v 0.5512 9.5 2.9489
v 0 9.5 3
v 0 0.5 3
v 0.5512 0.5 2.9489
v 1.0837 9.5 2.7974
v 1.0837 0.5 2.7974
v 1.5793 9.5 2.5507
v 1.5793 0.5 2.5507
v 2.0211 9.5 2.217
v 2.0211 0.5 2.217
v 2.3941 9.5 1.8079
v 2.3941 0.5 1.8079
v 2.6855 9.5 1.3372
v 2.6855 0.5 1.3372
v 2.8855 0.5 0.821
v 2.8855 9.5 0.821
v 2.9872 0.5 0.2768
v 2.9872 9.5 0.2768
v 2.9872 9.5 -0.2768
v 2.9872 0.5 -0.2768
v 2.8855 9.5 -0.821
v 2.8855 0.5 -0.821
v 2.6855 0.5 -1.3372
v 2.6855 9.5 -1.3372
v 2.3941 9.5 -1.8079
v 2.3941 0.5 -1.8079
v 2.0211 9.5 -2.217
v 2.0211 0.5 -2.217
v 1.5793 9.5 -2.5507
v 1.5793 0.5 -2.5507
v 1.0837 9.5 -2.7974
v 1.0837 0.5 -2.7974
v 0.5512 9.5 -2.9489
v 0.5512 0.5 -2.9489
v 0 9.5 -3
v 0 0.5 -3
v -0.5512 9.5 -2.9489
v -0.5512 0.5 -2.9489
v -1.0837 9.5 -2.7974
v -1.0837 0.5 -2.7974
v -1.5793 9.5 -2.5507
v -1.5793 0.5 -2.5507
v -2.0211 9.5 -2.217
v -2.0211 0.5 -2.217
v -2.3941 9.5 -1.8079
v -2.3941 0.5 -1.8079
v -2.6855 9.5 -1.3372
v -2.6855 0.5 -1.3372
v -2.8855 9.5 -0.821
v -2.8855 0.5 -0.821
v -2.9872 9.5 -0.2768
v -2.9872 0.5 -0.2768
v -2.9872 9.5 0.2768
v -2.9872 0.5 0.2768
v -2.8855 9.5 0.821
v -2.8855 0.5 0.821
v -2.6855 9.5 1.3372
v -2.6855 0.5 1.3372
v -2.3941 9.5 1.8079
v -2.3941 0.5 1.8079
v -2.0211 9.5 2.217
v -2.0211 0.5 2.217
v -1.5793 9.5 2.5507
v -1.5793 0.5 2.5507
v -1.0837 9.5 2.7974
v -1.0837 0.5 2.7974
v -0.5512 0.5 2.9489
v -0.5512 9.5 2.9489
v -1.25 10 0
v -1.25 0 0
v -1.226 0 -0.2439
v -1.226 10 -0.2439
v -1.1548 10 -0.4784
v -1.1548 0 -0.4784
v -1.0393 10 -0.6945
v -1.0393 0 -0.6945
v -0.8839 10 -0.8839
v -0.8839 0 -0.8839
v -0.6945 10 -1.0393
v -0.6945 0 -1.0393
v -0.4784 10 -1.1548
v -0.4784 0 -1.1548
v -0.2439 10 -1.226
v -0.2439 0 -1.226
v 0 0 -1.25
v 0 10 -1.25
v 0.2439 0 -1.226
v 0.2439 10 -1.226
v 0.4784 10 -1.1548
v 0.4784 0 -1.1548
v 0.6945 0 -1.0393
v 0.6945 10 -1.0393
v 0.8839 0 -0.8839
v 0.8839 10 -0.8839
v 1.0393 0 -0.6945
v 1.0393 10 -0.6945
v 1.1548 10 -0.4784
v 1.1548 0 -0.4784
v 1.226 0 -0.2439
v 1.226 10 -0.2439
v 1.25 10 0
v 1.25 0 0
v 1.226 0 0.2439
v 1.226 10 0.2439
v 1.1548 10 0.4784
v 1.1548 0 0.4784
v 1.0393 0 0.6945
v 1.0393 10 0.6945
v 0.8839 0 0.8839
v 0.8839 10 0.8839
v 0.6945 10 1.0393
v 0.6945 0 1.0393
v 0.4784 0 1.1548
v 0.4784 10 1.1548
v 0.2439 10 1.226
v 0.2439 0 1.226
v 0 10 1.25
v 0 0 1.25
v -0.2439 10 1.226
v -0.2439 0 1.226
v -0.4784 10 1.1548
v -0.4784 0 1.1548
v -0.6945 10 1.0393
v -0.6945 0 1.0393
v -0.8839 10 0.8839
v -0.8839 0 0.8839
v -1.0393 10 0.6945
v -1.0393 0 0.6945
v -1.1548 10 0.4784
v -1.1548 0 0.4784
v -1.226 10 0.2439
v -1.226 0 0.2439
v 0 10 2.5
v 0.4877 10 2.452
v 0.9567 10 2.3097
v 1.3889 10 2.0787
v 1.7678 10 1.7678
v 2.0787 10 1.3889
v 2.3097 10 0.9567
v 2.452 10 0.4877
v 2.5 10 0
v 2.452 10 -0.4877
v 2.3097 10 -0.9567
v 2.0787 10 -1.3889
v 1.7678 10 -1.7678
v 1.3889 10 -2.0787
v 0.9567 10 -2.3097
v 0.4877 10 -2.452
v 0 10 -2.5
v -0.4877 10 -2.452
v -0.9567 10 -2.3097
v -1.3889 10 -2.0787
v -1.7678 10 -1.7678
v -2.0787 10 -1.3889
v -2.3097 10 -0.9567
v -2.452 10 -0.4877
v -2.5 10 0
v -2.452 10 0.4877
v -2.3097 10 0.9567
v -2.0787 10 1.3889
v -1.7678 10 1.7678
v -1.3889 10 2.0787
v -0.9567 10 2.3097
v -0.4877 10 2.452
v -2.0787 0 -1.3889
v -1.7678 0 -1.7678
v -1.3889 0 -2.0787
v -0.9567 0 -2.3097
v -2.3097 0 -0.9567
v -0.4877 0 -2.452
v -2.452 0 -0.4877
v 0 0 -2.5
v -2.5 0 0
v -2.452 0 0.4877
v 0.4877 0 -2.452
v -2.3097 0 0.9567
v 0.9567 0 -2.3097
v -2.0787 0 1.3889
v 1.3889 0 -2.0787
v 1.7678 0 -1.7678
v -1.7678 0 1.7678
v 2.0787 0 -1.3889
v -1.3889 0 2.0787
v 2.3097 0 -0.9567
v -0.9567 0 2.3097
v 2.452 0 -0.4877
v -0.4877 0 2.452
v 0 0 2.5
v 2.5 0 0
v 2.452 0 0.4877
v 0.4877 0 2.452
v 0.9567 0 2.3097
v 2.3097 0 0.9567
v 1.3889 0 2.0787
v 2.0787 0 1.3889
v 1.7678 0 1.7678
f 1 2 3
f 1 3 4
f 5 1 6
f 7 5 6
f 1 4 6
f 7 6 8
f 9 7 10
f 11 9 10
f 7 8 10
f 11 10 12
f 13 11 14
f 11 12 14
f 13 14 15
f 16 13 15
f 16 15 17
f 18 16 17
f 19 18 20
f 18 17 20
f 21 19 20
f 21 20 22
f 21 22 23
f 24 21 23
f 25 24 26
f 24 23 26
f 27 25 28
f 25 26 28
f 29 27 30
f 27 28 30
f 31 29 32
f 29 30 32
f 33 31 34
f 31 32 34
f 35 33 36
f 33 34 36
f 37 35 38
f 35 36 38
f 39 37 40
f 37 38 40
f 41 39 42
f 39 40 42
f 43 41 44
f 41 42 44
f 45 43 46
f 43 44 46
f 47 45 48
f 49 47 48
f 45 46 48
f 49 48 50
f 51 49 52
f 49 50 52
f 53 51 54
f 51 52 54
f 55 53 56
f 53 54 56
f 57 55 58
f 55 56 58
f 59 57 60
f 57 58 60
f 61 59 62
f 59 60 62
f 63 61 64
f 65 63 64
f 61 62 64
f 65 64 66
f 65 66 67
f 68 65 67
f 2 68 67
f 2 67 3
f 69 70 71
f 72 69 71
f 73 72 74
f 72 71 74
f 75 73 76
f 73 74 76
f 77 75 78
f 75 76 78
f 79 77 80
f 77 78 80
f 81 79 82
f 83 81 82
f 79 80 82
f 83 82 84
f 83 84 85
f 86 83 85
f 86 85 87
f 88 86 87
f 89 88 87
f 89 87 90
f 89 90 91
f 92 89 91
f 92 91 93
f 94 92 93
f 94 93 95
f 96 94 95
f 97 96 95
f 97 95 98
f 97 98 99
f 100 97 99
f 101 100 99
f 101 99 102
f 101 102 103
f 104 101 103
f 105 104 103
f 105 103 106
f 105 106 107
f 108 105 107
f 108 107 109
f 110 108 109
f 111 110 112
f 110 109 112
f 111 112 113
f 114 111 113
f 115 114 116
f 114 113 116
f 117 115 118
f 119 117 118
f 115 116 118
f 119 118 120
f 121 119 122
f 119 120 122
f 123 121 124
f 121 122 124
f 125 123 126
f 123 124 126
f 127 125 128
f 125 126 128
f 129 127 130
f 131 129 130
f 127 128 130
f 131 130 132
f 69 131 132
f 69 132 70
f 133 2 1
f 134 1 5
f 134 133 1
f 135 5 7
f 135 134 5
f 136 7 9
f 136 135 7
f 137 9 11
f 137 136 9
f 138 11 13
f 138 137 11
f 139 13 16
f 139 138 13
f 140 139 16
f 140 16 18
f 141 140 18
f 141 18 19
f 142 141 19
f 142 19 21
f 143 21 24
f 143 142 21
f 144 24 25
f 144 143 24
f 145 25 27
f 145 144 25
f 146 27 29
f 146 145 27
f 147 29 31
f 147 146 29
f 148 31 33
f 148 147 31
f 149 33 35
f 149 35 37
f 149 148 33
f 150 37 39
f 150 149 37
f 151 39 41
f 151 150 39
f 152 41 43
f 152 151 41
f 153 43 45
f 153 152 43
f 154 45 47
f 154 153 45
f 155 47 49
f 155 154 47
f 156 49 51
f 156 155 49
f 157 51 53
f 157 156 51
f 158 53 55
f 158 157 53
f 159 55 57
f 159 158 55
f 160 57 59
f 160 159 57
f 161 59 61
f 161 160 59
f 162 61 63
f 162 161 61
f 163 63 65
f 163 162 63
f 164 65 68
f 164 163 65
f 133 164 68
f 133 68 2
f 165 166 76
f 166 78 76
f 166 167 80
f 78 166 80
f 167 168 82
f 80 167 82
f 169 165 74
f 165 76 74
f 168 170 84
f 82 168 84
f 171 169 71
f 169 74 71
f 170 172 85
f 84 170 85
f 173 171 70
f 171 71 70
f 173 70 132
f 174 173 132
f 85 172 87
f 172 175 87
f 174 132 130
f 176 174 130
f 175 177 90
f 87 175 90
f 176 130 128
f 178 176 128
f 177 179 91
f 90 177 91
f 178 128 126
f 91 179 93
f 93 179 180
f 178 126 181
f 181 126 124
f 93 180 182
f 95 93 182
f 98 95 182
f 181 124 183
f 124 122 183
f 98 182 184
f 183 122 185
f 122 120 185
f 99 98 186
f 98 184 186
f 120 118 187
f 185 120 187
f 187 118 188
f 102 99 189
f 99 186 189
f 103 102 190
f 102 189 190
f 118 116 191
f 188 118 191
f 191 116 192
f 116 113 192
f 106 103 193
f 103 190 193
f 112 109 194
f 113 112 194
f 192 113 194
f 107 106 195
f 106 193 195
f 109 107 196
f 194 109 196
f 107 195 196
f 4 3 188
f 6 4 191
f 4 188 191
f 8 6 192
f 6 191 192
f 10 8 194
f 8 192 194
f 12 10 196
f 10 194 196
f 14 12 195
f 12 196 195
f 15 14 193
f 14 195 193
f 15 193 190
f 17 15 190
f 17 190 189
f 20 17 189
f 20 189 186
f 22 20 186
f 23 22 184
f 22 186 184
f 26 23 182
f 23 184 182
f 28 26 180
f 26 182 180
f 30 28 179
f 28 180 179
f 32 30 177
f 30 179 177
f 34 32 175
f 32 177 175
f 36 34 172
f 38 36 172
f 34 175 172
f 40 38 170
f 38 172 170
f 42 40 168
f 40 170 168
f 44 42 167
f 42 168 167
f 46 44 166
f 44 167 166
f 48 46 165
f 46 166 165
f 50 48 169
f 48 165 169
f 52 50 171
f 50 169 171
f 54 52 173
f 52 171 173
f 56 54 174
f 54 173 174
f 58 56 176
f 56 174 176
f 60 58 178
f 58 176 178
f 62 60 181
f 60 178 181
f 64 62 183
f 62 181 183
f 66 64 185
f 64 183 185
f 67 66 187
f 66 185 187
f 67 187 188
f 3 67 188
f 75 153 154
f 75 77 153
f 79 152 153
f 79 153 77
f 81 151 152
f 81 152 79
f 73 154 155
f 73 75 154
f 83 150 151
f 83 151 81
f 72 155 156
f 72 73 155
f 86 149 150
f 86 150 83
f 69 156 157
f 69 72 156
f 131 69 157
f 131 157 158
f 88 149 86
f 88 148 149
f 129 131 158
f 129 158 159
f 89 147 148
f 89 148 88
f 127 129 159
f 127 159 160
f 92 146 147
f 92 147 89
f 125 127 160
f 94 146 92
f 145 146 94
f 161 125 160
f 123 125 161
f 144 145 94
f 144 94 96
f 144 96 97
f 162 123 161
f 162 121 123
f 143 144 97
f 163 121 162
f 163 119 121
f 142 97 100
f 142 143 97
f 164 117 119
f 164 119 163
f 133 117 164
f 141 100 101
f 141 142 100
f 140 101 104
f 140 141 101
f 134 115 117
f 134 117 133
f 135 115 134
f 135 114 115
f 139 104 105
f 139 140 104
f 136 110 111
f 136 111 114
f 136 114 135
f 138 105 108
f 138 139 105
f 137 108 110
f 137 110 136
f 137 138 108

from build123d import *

# Parameters (mm, degrees)
SKETCH1_R             = 3
BOSS_EXTRUDE1_DEPTH   = 10
M3X0_5_TAPPED_HOLE1_D = 2.5
CHAMFER1_SIZE         = 0.5


with BuildPart() as part:
    # Sketch1 → Boss-Extrude1 (new body)
    with BuildSketch(Plane(origin=(0, 0, 0), x_dir=(1, 0, 0), z_dir=(0, 1, 0))):
        with Locations(Location((0, 0, 0), (0, 0, 270))):
            Circle(SKETCH1_R)
    extrude(amount=BOSS_EXTRUDE1_DEPTH)

    # M3x0.5 Tapped Hole1 (through all)
    with Locations(Plane(origin=(0, 10, 0), x_dir=(1, 0, 0), z_dir=(0, 1, 0))):
        with Locations((0, 0)):
            Hole(M3X0_5_TAPPED_HOLE1_D / 2)

    # Chamfer1
    chamfer1_edges = [part.edges().sort_by_distance(p)[0] for p in [
        (0, 0, -3),
        (0, 10, -3),
    ]]
    chamfer(chamfer1_edges, length=CHAMFER1_SIZE)


solid = part.part
